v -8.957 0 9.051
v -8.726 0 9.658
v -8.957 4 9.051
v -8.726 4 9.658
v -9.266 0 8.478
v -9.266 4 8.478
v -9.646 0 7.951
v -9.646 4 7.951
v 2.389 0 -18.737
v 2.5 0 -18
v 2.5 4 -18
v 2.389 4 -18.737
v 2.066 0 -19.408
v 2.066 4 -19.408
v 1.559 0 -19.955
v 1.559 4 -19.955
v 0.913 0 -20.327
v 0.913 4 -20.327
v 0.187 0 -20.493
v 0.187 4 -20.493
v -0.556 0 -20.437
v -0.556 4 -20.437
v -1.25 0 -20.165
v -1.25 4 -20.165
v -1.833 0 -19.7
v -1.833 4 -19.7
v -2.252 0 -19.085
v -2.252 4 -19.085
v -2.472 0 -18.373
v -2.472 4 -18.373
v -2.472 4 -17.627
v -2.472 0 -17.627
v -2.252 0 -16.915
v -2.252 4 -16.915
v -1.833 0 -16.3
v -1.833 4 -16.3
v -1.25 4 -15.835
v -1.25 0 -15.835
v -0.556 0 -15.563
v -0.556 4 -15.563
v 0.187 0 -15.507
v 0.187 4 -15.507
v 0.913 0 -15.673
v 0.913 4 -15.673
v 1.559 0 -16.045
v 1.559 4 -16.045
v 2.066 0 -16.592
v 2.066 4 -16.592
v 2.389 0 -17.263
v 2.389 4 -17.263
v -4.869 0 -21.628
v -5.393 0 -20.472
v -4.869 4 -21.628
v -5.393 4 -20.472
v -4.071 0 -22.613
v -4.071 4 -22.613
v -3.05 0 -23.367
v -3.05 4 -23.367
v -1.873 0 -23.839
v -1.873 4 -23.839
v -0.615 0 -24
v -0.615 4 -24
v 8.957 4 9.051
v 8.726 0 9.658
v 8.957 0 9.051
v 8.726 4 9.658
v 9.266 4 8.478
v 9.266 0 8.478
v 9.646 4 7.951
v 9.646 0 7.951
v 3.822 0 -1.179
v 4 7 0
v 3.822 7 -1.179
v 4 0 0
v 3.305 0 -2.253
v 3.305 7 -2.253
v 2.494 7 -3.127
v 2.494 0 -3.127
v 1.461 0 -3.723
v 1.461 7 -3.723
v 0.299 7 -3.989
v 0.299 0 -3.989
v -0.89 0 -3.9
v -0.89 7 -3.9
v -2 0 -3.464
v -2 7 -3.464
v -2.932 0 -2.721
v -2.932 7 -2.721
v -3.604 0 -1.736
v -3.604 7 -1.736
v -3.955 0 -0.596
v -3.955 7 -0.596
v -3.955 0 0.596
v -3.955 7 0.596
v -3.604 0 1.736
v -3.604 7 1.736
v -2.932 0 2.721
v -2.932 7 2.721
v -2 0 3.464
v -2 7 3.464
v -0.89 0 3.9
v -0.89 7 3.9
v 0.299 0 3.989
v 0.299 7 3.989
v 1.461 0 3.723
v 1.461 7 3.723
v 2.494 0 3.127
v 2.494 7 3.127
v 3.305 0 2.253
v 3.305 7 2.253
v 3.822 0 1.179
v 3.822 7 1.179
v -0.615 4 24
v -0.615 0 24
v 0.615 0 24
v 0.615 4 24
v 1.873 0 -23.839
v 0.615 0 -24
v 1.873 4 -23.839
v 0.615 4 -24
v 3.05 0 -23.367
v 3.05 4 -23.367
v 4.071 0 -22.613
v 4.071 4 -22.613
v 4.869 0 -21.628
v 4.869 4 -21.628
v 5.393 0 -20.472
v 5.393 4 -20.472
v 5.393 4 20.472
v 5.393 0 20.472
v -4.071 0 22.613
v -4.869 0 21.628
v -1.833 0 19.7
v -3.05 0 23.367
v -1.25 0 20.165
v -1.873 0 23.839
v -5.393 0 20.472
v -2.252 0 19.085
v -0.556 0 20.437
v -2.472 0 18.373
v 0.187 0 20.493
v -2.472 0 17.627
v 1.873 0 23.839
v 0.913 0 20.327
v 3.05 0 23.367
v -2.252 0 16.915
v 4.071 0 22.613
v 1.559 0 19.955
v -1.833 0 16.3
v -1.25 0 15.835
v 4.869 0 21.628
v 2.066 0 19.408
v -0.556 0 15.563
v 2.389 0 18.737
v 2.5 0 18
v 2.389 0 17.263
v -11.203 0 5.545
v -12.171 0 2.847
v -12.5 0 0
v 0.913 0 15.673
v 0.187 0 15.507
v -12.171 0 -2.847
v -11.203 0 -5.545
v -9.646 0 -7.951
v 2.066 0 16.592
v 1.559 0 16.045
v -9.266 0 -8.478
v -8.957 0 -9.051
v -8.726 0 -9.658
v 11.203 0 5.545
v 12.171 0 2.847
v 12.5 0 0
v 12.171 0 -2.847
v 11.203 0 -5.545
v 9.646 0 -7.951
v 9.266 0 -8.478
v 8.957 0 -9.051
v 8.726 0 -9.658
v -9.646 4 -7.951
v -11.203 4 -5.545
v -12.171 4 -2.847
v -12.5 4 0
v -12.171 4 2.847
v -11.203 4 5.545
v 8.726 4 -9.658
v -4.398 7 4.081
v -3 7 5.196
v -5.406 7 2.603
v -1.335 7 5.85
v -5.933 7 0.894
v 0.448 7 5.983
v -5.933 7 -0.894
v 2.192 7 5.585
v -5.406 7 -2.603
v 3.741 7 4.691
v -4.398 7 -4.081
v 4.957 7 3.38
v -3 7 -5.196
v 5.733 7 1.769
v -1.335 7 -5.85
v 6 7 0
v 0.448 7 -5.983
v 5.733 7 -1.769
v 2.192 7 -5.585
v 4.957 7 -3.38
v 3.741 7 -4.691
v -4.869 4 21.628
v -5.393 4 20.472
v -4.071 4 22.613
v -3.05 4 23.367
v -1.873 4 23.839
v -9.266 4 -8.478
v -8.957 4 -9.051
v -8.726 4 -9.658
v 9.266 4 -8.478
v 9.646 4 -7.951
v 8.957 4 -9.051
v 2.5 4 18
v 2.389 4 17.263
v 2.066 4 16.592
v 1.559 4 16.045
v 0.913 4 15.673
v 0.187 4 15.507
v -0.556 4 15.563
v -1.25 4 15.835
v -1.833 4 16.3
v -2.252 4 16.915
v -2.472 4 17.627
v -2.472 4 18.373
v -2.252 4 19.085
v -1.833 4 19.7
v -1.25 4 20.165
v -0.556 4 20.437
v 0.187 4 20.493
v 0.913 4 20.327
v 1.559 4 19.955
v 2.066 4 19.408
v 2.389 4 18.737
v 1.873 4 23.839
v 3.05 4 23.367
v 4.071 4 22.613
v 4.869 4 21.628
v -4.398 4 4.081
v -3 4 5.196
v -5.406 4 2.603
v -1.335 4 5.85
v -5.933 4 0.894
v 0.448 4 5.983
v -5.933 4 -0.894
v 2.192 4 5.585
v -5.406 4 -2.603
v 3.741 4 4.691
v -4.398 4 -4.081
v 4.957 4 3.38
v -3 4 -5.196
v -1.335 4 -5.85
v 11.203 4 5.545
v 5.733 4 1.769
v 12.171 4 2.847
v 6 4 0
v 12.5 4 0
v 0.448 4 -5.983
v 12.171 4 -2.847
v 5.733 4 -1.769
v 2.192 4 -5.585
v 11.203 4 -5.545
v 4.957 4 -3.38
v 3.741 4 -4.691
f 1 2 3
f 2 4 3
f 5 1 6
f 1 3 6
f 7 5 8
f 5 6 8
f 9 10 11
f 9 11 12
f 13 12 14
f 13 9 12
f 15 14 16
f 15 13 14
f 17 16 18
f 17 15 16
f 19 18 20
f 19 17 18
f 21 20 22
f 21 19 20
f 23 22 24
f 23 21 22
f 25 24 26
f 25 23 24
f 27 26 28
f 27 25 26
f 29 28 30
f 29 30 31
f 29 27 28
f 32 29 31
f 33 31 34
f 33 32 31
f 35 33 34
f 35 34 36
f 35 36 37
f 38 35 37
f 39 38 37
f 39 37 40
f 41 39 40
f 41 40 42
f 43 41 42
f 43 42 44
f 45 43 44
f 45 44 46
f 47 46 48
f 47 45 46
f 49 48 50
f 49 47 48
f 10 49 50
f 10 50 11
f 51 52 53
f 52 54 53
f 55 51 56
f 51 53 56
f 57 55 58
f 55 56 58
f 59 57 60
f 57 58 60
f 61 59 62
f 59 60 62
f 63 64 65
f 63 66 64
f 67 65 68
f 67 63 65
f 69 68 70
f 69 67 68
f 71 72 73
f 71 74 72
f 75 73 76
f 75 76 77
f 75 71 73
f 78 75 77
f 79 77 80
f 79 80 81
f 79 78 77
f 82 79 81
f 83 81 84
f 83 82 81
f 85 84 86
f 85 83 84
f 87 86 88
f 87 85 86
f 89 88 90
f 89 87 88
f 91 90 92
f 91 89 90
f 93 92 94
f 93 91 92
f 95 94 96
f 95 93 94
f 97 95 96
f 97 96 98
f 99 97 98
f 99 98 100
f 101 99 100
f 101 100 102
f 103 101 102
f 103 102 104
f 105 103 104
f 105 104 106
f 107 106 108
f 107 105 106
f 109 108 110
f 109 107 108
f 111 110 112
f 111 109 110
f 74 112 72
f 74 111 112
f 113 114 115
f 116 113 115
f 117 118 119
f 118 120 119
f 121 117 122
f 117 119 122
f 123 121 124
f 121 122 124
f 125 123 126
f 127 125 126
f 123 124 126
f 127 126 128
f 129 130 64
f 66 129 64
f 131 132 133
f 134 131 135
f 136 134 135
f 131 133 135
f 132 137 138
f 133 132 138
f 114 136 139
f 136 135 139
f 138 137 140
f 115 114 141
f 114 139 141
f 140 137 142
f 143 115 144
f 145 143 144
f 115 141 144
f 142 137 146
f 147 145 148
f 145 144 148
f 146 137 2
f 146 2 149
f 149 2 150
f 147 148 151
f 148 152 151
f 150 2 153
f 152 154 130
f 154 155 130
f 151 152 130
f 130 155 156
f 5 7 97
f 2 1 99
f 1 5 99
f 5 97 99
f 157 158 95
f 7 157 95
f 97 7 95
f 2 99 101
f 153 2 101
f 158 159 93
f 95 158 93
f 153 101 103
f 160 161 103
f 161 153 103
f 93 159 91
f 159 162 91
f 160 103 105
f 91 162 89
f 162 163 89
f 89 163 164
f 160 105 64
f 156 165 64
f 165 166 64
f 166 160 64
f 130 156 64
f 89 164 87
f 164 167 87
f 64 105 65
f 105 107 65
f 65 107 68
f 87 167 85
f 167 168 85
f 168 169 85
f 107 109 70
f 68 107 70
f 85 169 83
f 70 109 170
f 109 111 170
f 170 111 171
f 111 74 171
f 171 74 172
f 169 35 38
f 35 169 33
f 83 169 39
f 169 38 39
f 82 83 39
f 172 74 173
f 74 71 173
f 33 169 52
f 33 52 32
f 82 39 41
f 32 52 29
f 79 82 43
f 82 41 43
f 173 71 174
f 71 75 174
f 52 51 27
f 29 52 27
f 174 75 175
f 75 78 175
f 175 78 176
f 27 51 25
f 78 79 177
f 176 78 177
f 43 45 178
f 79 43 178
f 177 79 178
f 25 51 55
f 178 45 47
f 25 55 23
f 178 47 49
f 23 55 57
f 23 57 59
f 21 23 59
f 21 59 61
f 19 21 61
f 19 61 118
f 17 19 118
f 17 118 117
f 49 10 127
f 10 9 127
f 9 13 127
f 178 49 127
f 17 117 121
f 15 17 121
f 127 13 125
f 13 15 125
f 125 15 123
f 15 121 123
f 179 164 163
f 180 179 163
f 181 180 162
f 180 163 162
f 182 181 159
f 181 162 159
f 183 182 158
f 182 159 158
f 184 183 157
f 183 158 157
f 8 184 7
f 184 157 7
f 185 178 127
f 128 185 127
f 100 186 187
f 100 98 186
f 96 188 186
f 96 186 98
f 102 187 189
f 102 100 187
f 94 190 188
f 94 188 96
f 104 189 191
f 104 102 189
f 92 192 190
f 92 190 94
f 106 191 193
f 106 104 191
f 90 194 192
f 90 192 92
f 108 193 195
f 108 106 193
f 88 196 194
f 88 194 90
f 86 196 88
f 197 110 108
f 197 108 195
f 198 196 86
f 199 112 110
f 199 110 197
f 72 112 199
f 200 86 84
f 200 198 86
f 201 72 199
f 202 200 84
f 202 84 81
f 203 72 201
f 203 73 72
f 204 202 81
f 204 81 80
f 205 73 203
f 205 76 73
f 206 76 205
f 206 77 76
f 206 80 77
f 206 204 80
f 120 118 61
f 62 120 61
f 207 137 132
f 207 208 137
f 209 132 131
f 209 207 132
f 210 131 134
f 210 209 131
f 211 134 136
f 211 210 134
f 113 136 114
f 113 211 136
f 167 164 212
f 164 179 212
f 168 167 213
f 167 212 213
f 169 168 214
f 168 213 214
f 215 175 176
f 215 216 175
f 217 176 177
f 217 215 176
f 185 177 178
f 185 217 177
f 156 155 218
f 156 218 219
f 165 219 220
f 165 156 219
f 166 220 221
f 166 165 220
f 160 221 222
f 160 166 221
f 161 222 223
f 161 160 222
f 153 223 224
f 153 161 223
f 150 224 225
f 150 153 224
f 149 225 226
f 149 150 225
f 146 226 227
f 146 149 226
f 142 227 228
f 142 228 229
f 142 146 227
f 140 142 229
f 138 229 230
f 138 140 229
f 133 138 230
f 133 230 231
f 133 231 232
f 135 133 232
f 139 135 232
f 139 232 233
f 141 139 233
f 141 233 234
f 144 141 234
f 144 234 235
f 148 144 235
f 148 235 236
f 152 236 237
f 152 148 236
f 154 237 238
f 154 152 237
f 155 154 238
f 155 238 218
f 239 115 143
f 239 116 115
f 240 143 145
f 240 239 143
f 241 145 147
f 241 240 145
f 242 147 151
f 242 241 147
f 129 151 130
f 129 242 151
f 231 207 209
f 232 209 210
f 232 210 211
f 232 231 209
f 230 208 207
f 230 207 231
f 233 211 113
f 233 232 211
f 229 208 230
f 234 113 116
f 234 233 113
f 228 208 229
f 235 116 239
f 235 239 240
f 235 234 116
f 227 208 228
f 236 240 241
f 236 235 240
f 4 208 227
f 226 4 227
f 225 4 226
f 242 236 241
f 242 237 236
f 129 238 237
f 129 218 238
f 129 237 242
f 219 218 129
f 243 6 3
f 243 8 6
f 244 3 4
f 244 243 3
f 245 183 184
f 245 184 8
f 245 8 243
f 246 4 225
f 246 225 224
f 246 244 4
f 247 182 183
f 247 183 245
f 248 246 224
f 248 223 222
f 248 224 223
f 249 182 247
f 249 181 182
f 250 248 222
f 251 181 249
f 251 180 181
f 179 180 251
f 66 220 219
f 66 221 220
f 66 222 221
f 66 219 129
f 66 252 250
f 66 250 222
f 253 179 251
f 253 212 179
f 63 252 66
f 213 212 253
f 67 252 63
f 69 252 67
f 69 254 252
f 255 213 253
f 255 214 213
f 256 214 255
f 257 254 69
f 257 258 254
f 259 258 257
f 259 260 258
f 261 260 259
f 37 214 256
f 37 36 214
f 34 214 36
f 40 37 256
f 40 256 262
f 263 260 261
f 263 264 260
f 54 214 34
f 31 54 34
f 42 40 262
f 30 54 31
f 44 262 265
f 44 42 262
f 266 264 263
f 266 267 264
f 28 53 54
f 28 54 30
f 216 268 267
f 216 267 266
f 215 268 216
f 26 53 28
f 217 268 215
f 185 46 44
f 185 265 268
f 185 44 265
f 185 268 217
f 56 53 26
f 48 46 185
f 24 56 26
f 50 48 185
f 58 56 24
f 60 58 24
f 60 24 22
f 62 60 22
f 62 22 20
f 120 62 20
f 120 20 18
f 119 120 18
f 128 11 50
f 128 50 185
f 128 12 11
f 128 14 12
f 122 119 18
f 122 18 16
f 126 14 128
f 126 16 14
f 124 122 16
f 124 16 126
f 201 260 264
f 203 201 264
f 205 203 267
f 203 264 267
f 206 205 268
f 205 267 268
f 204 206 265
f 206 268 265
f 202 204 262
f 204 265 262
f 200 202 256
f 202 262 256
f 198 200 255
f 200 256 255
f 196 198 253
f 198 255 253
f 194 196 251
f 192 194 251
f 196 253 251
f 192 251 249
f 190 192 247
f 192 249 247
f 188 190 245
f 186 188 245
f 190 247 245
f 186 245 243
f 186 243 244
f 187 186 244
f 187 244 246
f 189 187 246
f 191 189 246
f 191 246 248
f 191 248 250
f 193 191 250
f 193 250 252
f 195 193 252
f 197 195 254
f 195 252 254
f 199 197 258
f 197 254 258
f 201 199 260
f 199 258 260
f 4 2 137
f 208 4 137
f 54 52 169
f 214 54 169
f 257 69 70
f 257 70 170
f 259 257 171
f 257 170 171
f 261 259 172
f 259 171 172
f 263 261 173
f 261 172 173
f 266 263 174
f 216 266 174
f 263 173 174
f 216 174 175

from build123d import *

# Parameters (mm, degrees)
SKETCH_1_R      = 2.5
SKETCH_1_R_2    = 12.5
SKETCH_1_R_3    = 4
EXTRUDE_1_DEPTH = 4
FILLET_1_R      = 5
SKETCH_2_R      = 6
SKETCH_2_R_2    = 4
EXTRUDE_2_DEPTH = 3


with BuildPart() as part:
    # 草图1 → 凸台-拉伸1 (new body)
    with BuildSketch(Plane(origin=(0, 0, 0), x_dir=(1, 0, 0), z_dir=(0, 1, 0))):
        with BuildLine():
            Line((-9.042322889, -8.630550201), (-4.305971765, -24))
            Line((-4.305971765, -24), (4.305971765, -24))
            Line((4.305971765, -24), (9.042322889, -8.630550201))
            ThreePointArc((9.042322889, -8.630550201), (0, -12.5), (-9.042322889, -8.630550201))
        make_face()
        with Locations((0, -18)):
            Circle(SKETCH_1_R, mode=Mode.SUBTRACT)
        Circle(SKETCH_1_R_2)
        Circle(SKETCH_1_R_3, mode=Mode.SUBTRACT)
        with BuildLine():
            Line((-4.305971765, 24), (-9.042322889, 8.630550201))
            ThreePointArc((-9.042322889, 8.630550201), (0, 12.5), (9.042322889, 8.630550201))
            Line((9.042322889, 8.630550201), (4.305971765, 24))
            Line((4.305971765, 24), (-4.305971765, 24))
        make_face()
        with Locations((0, 18)):
            Circle(SKETCH_1_R, mode=Mode.SUBTRACT)
    extrude(amount=EXTRUDE_1_DEPTH)

    # 圆角1
    fillet_1_edges = [part.edges().sort_by_distance(p)[0] for p in [
        (4.305971765, 2, 24),
        (-4.305971765, 2, 24),
        (-9.042322889, 2, 8.630550201),
        (-9.042322889, 2, -8.630550201),
        (-4.305971765, 2, -24),
        (4.305971765, 2, -24),
        (9.042322889, 2, -8.630550201),
        (9.042322889, 2, 8.630550201),
    ]]
    fillet(fillet_1_edges, radius=FILLET_1_R)

    # 草图2 → 凸台-拉伸2 (add)
    with BuildSketch(Plane(origin=(0, 4, 0), x_dir=(1, 0, 0), z_dir=(0, 1, 0))):
        Circle(SKETCH_2_R)
        Circle(SKETCH_2_R_2, mode=Mode.SUBTRACT)
    extrude(amount=EXTRUDE_2_DEPTH)


solid = part.part
